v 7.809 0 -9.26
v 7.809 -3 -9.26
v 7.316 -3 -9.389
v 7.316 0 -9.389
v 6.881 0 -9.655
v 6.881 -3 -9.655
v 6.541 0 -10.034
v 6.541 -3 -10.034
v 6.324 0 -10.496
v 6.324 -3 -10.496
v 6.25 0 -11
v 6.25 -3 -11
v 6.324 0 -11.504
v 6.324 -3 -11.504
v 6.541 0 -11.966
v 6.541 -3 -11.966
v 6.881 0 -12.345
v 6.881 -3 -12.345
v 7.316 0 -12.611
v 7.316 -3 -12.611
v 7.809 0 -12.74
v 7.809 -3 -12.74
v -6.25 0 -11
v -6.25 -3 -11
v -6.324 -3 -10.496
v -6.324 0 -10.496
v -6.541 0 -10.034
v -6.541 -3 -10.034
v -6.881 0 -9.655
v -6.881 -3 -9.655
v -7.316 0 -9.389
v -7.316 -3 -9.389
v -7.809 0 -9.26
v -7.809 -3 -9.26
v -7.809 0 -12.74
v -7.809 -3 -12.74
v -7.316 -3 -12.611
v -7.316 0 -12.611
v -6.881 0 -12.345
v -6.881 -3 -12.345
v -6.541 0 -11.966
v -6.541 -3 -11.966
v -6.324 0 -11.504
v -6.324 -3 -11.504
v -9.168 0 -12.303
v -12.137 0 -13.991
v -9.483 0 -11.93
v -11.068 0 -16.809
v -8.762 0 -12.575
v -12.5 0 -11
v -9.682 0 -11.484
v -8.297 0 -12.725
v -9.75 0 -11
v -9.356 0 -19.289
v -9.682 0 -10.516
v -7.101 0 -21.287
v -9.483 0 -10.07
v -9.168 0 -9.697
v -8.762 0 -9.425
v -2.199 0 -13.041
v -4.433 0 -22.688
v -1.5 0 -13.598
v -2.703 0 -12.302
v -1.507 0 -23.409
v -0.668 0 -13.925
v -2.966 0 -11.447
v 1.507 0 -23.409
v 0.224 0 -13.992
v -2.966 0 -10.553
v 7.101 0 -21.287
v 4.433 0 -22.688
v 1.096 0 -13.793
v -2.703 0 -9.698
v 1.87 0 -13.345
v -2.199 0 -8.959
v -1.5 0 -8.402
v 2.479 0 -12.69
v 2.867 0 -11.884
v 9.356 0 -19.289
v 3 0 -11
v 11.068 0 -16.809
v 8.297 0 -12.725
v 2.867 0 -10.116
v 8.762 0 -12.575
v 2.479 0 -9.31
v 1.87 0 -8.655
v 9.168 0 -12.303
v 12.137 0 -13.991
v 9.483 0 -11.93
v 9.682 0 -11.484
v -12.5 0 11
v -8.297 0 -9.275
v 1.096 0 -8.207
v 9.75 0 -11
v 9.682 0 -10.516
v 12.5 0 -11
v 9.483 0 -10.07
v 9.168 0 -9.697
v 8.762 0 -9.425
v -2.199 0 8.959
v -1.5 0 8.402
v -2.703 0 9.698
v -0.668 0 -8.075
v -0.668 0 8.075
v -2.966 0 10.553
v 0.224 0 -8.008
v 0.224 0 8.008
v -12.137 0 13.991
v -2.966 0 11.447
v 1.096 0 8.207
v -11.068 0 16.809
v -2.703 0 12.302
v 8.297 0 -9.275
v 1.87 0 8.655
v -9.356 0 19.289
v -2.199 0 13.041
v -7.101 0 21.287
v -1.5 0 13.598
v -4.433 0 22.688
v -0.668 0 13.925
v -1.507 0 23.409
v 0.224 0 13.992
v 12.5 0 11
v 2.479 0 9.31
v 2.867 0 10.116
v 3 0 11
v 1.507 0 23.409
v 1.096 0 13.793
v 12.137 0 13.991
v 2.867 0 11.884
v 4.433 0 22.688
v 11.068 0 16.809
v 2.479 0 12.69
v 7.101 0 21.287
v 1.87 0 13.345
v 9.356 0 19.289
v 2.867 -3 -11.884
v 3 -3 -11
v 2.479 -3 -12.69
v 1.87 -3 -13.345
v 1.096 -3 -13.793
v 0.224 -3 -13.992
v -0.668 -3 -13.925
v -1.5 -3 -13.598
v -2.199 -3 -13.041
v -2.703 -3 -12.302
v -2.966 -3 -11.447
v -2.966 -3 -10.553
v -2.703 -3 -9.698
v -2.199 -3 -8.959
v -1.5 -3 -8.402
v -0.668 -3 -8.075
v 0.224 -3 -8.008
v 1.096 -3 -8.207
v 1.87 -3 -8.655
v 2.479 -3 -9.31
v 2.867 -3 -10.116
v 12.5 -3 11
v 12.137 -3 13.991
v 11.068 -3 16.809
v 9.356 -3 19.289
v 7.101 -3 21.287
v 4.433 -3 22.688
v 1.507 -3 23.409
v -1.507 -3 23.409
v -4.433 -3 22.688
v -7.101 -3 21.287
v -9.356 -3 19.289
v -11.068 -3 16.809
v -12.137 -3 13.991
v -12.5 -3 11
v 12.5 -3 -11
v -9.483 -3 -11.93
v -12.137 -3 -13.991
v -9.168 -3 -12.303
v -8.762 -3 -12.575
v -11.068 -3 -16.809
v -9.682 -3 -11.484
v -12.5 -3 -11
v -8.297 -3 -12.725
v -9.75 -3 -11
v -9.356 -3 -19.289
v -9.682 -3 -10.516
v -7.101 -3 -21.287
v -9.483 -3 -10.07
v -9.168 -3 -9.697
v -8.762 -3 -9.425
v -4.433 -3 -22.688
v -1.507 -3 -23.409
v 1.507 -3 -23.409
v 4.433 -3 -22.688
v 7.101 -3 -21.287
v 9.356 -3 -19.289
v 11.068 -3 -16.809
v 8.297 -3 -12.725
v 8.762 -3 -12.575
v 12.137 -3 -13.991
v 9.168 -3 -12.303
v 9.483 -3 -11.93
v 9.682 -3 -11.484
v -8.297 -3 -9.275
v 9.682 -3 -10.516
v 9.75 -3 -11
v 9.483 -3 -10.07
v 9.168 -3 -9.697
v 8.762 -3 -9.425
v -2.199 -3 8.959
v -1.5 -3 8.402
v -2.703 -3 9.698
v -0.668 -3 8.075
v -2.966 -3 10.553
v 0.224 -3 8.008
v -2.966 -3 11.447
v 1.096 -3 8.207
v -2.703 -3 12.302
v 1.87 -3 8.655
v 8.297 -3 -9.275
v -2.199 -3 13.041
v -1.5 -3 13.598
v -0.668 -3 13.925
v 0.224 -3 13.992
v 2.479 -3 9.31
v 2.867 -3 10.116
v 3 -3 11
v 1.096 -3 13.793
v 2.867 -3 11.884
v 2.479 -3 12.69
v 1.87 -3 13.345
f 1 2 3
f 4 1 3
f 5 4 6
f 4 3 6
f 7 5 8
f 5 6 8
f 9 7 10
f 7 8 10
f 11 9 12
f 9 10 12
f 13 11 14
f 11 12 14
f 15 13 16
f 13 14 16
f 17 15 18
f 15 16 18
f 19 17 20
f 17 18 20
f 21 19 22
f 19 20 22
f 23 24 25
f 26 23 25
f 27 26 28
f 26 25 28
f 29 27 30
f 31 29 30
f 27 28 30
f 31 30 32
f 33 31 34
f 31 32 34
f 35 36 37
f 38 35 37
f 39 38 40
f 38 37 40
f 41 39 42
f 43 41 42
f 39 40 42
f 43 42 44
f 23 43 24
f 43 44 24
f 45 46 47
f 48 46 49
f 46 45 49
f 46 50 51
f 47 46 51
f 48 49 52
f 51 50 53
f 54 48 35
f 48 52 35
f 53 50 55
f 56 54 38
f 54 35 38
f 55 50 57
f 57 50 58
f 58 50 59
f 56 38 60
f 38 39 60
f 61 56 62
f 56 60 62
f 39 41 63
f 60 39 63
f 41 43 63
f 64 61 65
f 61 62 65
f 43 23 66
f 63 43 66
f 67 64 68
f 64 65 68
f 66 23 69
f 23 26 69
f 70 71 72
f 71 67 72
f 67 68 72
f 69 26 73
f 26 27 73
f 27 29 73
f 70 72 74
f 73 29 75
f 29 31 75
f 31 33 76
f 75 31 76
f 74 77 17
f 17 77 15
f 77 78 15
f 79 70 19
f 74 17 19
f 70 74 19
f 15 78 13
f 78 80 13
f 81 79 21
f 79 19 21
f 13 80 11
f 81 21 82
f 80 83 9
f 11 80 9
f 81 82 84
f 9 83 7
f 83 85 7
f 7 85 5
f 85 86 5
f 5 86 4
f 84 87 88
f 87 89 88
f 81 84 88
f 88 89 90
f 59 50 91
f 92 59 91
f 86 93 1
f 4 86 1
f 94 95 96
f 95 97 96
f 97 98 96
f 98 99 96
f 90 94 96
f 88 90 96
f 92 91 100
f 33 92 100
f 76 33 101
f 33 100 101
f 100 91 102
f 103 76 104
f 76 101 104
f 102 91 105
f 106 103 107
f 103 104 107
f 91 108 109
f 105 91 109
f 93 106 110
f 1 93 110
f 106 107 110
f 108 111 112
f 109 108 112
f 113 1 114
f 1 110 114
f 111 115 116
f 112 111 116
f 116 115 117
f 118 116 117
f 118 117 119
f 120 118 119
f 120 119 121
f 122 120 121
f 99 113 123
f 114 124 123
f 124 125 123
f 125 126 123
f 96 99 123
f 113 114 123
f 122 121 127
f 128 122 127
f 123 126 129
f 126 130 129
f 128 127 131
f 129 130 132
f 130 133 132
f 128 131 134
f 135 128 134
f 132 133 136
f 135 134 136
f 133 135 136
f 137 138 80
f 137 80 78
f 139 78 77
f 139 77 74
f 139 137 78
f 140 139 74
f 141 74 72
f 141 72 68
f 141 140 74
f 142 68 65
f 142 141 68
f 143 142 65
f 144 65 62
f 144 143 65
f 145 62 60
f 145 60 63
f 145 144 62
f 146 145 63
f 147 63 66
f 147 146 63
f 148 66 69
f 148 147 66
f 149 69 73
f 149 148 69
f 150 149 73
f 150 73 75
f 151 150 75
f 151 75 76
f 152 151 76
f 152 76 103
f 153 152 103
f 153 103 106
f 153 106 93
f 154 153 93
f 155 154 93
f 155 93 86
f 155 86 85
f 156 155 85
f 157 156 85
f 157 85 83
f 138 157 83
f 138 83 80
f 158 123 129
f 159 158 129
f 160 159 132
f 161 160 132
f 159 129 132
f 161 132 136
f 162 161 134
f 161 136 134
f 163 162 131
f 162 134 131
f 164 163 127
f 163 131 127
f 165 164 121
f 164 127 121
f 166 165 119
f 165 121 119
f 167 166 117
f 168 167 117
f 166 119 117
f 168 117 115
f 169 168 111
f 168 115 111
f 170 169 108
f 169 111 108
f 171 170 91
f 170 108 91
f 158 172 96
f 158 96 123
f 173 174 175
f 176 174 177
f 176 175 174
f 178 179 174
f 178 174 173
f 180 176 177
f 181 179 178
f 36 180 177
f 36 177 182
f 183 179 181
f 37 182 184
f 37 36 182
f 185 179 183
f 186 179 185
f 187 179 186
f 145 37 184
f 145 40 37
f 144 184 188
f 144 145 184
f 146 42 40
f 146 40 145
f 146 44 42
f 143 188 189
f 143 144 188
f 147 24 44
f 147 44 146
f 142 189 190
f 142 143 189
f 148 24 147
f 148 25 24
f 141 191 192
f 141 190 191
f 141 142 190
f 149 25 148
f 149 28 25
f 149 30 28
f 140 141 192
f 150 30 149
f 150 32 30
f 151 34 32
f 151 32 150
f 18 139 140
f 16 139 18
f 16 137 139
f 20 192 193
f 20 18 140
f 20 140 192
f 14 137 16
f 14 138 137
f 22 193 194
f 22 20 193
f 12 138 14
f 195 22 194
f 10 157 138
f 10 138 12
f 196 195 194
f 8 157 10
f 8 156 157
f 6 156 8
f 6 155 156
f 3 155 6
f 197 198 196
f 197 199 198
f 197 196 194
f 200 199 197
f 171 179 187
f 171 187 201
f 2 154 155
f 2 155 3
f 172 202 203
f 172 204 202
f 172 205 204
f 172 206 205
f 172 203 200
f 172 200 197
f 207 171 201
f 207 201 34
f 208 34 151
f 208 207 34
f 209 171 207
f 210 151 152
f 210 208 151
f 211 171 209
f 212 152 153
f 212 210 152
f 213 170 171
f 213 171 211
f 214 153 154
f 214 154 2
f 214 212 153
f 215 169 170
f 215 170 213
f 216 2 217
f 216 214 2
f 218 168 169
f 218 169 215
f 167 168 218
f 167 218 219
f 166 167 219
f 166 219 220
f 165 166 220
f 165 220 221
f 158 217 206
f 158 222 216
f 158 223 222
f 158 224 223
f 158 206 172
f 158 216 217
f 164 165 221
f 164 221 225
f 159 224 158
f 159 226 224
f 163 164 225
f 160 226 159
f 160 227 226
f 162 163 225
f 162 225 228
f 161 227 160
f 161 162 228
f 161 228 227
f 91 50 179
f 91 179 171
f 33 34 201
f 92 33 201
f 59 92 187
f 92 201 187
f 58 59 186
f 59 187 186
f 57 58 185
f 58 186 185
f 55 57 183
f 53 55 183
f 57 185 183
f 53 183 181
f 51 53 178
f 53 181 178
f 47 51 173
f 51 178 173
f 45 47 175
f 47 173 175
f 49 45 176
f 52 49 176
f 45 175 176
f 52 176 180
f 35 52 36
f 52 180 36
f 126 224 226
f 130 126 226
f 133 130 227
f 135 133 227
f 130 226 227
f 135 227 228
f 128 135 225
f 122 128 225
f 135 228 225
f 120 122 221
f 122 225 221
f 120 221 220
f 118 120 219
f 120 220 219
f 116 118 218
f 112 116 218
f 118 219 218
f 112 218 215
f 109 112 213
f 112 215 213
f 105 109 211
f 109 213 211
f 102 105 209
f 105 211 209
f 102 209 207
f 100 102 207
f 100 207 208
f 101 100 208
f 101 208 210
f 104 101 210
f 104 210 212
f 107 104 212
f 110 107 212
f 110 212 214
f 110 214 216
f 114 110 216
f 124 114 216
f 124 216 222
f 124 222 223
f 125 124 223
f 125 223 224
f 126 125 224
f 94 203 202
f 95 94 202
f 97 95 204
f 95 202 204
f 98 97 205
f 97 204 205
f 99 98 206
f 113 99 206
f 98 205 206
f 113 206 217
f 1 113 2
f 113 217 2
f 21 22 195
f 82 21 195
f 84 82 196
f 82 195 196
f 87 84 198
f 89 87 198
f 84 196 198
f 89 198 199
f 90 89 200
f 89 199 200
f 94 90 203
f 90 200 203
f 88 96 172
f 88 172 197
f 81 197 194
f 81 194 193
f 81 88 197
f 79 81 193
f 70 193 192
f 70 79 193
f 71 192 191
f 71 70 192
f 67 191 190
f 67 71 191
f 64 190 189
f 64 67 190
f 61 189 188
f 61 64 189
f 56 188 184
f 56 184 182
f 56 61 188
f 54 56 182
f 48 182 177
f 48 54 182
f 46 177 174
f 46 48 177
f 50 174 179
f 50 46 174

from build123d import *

# Parameters (mm, degrees)
F1_DEPTH = 3
F2_R     = 3
F3_DEPTH = 25
F6_DEPTH = 25
F8_DEPTH = 3


with BuildPart() as f1:
    # F0 (on Front) → F1 (new body)
    with BuildSketch(Plane.XZ):
        with BuildLine():
            ThreePointArc((5.9371710435, 0), (10.73463176, 4.595495259), (12.5, 11))
            ThreePointArc((12.5, 11), (0, 23.5), (-12.5, 11))
            ThreePointArc((-12.5, 11), (-10.73463176, 4.595495259), (-5.9371710435, 0))
            Line((-5.9371710435, 0), (5.9371710435, 0))
        make_face()
        with BuildLine():
            ThreePointArc((-5.9371710435, 0), (-10.73463176, 4.595495259), (-12.5, 11))
            Line((-12.5, 11), (-12.5, 0))
            Line((-12.5, 0), (-5.9371710435, 0))
        make_face()
    extrude(amount=F1_DEPTH)

    # F2 (on face) → F3 (cut)
    with BuildSketch(Plane.XZ.offset(3)):
        with Locations((0, 11)):
            Circle(F2_R)
    extrude(amount=-F3_DEPTH, mode=Mode.SUBTRACT)

    # F4: F1 across face


with BuildPart() as f1_1:
    add(f1.part)
    add(f1.part.mirror(Plane(origin=(-3.2814144782, -1.5, 0), x_dir=(1, 0, 0), z_dir=(0, 0, -1))))

    # F5 (on face) → F6 (cut)
    with BuildSketch(Plane.XZ.offset(3)):
        with BuildLine():
            ThreePointArc((-7.80859375, -12.7395009766), (-8, -11), (-7.80859375, -9.2604990234))
            ThreePointArc((-7.80859375, -9.2604990234), (-9.75, -11), (-7.80859375, -12.7395009766))
        make_face()
        with BuildLine():
            ThreePointArc((-6.25, -11), (-6.6966464529, -9.8321945662), (-7.80859375, -9.2604990234))
            ThreePointArc((-7.80859375, -9.2604990234), (-8, -11), (-7.80859375, -12.7395009766))
            ThreePointArc((-7.80859375, -12.7395009766), (-6.6966464529, -12.1678054338), (-6.25, -11))
        make_face()
        with BuildLine():
            ThreePointArc((7.80859375, -9.2604990234), (7.9520044643, -10.125), (8, -11))
            ThreePointArc((8, -11), (7.9520044643, -11.875), (7.80859375, -12.7395009766))
            ThreePointArc((7.80859375, -12.7395009766), (9.1678054338, -12.3033535471), (9.75, -11))
            ThreePointArc((9.75, -11), (9.1678054338, -9.6966464529), (7.80859375, -9.2604990234))
        make_face()
        with BuildLine():
            ThreePointArc((7.80859375, -12.7395009766), (7.9520044643, -11.875), (8, -11))
            ThreePointArc((8, -11), (7.9520044643, -10.125), (7.80859375, -9.2604990234))
            ThreePointArc((7.80859375, -9.2604990234), (6.25, -11), (7.80859375, -12.7395009766))
        make_face()
    extrude(amount=-F6_DEPTH, mode=Mode.SUBTRACT)

    # F7 (on face) → F8 (join)
    with BuildSketch(Plane.XZ.offset(3)):
        with BuildLine():
            Line((12.5, -11), (12.5, 11))
            ThreePointArc((12.5, 11), (10.73463176, 4.595495259), (5.9371710435, 0))
            ThreePointArc((5.9371710435, 0), (10.73463176, -4.595495259), (12.5, -11))
        make_face()
    extrude(amount=-F8_DEPTH)


solid = f1_1.part
